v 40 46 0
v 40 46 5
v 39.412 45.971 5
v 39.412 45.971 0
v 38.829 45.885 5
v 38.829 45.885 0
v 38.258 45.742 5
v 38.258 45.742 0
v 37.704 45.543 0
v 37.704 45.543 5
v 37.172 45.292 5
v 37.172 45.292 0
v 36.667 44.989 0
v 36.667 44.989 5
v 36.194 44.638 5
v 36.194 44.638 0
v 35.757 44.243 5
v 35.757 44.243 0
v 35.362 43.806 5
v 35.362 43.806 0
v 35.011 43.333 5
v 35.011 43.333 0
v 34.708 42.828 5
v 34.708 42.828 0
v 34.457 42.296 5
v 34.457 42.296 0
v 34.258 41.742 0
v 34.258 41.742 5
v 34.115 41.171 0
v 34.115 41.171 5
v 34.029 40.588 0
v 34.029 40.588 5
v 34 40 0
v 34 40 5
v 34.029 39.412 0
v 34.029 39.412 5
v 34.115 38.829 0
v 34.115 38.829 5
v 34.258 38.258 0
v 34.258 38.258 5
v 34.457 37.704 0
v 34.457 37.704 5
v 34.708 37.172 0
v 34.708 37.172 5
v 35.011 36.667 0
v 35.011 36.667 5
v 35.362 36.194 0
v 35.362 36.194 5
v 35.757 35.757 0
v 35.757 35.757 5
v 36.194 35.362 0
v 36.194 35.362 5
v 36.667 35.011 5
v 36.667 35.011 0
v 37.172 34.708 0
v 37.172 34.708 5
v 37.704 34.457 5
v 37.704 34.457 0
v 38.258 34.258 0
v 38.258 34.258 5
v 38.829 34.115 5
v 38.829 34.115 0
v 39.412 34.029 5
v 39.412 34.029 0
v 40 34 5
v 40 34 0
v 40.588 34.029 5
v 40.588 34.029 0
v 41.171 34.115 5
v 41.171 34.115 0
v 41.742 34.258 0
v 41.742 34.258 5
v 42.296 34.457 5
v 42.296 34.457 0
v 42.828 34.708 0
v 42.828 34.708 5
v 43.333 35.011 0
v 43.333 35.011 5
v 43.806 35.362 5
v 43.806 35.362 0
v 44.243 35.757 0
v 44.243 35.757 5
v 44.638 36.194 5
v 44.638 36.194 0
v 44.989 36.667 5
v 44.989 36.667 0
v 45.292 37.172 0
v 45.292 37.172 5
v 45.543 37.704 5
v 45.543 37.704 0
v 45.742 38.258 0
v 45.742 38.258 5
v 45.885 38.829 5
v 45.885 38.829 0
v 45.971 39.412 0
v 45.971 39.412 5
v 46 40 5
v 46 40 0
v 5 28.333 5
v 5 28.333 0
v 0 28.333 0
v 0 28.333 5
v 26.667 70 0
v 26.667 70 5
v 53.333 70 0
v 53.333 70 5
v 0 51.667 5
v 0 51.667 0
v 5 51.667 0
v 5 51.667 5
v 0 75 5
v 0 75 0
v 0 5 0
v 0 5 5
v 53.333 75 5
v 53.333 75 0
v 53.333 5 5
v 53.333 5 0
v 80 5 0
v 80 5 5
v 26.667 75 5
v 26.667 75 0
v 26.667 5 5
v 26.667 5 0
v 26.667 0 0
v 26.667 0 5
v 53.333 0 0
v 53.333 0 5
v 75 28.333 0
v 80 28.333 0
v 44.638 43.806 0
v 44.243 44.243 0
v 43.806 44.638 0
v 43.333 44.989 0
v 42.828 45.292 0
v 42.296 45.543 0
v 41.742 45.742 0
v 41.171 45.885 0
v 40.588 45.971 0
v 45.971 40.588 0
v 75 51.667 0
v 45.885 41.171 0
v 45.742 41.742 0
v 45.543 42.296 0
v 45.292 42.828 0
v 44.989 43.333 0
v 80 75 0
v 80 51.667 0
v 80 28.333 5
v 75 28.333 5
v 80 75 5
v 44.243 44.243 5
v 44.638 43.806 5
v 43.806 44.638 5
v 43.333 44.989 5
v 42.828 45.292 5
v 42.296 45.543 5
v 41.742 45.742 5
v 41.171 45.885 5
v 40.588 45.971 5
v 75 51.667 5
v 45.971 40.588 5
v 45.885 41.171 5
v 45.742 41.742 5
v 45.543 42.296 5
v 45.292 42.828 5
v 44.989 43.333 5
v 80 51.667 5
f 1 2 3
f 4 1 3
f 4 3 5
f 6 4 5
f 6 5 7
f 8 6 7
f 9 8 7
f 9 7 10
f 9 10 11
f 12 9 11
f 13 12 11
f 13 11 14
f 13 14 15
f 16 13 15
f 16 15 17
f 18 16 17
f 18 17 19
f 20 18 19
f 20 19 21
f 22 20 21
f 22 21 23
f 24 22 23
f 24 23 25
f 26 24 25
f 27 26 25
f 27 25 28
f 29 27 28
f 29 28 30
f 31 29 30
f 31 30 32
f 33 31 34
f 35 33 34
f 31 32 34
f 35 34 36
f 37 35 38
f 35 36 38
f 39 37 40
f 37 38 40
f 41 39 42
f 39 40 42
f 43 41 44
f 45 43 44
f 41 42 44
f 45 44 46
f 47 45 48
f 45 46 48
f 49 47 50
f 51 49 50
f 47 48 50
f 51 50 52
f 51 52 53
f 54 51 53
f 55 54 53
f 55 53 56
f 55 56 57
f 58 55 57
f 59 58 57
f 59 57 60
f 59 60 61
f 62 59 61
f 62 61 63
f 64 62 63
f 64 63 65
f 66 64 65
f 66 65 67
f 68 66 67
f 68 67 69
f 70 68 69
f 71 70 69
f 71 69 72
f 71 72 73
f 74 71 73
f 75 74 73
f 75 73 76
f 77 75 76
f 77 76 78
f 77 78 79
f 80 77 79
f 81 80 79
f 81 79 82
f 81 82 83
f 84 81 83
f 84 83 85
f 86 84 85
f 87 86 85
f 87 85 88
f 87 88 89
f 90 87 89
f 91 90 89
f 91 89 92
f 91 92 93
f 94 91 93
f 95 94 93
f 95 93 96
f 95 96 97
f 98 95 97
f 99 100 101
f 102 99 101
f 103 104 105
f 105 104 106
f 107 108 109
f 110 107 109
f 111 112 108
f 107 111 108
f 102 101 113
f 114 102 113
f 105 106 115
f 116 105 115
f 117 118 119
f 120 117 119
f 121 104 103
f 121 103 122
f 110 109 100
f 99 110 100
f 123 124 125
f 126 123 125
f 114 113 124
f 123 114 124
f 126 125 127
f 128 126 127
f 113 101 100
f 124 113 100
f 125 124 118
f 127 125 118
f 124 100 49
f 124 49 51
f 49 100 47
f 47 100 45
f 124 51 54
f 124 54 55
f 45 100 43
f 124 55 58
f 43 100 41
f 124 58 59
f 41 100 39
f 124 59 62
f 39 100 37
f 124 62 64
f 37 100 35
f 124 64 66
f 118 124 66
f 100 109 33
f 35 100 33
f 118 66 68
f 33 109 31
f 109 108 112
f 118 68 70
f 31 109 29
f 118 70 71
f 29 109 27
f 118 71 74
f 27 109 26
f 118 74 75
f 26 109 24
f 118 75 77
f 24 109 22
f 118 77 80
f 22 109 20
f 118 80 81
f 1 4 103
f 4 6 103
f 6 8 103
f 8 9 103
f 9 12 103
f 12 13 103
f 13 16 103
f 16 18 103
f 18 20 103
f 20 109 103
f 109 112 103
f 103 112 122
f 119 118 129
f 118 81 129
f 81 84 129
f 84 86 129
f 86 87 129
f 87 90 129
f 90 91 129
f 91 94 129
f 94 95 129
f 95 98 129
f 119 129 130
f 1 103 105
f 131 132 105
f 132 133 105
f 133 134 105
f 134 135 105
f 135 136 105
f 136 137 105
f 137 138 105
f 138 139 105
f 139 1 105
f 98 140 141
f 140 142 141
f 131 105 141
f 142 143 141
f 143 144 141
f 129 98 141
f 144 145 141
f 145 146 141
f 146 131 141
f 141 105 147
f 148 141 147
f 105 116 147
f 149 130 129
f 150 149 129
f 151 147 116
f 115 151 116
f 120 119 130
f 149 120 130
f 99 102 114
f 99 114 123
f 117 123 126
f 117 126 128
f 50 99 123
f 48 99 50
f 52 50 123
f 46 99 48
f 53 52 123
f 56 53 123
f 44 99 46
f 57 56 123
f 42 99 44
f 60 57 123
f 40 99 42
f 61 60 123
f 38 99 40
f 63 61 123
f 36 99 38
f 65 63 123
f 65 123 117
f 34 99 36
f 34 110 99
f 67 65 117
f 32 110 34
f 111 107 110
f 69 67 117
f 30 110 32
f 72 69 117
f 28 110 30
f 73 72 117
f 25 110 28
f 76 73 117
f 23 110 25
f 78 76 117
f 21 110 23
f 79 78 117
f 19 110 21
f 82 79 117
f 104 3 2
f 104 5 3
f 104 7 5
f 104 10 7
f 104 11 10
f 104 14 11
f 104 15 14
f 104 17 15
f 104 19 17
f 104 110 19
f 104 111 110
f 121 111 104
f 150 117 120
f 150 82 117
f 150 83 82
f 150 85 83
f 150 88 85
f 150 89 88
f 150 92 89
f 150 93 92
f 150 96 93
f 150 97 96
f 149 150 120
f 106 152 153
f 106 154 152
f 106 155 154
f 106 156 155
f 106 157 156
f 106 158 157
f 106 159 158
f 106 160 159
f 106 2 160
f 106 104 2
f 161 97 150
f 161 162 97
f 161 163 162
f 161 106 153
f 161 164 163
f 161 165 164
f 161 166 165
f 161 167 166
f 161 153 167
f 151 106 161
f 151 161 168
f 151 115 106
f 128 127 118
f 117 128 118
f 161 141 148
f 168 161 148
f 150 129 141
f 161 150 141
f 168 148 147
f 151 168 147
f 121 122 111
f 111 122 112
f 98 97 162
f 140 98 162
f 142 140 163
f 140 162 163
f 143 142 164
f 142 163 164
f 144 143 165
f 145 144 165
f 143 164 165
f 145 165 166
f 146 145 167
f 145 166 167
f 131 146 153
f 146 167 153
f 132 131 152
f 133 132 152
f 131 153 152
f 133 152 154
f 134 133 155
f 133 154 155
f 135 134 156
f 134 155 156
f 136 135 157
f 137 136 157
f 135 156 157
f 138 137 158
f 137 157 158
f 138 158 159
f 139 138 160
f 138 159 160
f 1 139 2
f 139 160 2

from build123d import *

# Parameters (mm, degrees)
SALIENTE_EXTRUIR1_DEPTH = 5
CROQUIS2_W              = 26.666666666
CROQUIS2_H              = 5
CORTAR_EXTRUIR1_DEPTH   = 10
CORTAR_EXTRUIR3_DEPTH   = 10


with BuildPart() as part:
    # Croquis1 → Saliente-Extruir1 (new body)
    with BuildSketch(Plane.XY):
        Polygon((0, 28.333333333), (0, 5), (26.666666667, 5), (26.666666667, 0), (53.333333333, 0), (53.333333333, 5), (80, 5), (80, 28.333333333), (75, 28.333333333), (75, 51.666666667), (80, 51.666666667), (80, 75), (0, 75), (0, 51.666666667), (5, 51.666666667), (5, 28.333333333), align=None)
    extrude(amount=SALIENTE_EXTRUIR1_DEPTH)

    # Croquis2 → Cortar-Extruir1 (cut)
    with BuildSketch(Plane.XY.offset(5)):
        with Locations((40, 72.5)):
            Rectangle(CROQUIS2_W, CROQUIS2_H)
    extrude(amount=-CORTAR_EXTRUIR1_DEPTH, mode=Mode.SUBTRACT)

    # Croquis5 → Cortar-Extruir3 (cut)
    with BuildSketch(Plane.XY.offset(5)):
        with BuildLine():
            ThreePointArc((46, 40), (44.242640687, 44.242640687), (40, 46))
            Line((40, 46), (40, 40))
            Line((40, 40), (46, 40))
        make_face()
        with BuildLine():
            Line((40, 40), (40, 46))
            ThreePointArc((40, 46), (35.757359313, 35.757359313), (46, 40))
            Line((46, 40), (40, 40))
        make_face()
    extrude(amount=-CORTAR_EXTRUIR3_DEPTH, mode=Mode.SUBTRACT)


solid = part.part
